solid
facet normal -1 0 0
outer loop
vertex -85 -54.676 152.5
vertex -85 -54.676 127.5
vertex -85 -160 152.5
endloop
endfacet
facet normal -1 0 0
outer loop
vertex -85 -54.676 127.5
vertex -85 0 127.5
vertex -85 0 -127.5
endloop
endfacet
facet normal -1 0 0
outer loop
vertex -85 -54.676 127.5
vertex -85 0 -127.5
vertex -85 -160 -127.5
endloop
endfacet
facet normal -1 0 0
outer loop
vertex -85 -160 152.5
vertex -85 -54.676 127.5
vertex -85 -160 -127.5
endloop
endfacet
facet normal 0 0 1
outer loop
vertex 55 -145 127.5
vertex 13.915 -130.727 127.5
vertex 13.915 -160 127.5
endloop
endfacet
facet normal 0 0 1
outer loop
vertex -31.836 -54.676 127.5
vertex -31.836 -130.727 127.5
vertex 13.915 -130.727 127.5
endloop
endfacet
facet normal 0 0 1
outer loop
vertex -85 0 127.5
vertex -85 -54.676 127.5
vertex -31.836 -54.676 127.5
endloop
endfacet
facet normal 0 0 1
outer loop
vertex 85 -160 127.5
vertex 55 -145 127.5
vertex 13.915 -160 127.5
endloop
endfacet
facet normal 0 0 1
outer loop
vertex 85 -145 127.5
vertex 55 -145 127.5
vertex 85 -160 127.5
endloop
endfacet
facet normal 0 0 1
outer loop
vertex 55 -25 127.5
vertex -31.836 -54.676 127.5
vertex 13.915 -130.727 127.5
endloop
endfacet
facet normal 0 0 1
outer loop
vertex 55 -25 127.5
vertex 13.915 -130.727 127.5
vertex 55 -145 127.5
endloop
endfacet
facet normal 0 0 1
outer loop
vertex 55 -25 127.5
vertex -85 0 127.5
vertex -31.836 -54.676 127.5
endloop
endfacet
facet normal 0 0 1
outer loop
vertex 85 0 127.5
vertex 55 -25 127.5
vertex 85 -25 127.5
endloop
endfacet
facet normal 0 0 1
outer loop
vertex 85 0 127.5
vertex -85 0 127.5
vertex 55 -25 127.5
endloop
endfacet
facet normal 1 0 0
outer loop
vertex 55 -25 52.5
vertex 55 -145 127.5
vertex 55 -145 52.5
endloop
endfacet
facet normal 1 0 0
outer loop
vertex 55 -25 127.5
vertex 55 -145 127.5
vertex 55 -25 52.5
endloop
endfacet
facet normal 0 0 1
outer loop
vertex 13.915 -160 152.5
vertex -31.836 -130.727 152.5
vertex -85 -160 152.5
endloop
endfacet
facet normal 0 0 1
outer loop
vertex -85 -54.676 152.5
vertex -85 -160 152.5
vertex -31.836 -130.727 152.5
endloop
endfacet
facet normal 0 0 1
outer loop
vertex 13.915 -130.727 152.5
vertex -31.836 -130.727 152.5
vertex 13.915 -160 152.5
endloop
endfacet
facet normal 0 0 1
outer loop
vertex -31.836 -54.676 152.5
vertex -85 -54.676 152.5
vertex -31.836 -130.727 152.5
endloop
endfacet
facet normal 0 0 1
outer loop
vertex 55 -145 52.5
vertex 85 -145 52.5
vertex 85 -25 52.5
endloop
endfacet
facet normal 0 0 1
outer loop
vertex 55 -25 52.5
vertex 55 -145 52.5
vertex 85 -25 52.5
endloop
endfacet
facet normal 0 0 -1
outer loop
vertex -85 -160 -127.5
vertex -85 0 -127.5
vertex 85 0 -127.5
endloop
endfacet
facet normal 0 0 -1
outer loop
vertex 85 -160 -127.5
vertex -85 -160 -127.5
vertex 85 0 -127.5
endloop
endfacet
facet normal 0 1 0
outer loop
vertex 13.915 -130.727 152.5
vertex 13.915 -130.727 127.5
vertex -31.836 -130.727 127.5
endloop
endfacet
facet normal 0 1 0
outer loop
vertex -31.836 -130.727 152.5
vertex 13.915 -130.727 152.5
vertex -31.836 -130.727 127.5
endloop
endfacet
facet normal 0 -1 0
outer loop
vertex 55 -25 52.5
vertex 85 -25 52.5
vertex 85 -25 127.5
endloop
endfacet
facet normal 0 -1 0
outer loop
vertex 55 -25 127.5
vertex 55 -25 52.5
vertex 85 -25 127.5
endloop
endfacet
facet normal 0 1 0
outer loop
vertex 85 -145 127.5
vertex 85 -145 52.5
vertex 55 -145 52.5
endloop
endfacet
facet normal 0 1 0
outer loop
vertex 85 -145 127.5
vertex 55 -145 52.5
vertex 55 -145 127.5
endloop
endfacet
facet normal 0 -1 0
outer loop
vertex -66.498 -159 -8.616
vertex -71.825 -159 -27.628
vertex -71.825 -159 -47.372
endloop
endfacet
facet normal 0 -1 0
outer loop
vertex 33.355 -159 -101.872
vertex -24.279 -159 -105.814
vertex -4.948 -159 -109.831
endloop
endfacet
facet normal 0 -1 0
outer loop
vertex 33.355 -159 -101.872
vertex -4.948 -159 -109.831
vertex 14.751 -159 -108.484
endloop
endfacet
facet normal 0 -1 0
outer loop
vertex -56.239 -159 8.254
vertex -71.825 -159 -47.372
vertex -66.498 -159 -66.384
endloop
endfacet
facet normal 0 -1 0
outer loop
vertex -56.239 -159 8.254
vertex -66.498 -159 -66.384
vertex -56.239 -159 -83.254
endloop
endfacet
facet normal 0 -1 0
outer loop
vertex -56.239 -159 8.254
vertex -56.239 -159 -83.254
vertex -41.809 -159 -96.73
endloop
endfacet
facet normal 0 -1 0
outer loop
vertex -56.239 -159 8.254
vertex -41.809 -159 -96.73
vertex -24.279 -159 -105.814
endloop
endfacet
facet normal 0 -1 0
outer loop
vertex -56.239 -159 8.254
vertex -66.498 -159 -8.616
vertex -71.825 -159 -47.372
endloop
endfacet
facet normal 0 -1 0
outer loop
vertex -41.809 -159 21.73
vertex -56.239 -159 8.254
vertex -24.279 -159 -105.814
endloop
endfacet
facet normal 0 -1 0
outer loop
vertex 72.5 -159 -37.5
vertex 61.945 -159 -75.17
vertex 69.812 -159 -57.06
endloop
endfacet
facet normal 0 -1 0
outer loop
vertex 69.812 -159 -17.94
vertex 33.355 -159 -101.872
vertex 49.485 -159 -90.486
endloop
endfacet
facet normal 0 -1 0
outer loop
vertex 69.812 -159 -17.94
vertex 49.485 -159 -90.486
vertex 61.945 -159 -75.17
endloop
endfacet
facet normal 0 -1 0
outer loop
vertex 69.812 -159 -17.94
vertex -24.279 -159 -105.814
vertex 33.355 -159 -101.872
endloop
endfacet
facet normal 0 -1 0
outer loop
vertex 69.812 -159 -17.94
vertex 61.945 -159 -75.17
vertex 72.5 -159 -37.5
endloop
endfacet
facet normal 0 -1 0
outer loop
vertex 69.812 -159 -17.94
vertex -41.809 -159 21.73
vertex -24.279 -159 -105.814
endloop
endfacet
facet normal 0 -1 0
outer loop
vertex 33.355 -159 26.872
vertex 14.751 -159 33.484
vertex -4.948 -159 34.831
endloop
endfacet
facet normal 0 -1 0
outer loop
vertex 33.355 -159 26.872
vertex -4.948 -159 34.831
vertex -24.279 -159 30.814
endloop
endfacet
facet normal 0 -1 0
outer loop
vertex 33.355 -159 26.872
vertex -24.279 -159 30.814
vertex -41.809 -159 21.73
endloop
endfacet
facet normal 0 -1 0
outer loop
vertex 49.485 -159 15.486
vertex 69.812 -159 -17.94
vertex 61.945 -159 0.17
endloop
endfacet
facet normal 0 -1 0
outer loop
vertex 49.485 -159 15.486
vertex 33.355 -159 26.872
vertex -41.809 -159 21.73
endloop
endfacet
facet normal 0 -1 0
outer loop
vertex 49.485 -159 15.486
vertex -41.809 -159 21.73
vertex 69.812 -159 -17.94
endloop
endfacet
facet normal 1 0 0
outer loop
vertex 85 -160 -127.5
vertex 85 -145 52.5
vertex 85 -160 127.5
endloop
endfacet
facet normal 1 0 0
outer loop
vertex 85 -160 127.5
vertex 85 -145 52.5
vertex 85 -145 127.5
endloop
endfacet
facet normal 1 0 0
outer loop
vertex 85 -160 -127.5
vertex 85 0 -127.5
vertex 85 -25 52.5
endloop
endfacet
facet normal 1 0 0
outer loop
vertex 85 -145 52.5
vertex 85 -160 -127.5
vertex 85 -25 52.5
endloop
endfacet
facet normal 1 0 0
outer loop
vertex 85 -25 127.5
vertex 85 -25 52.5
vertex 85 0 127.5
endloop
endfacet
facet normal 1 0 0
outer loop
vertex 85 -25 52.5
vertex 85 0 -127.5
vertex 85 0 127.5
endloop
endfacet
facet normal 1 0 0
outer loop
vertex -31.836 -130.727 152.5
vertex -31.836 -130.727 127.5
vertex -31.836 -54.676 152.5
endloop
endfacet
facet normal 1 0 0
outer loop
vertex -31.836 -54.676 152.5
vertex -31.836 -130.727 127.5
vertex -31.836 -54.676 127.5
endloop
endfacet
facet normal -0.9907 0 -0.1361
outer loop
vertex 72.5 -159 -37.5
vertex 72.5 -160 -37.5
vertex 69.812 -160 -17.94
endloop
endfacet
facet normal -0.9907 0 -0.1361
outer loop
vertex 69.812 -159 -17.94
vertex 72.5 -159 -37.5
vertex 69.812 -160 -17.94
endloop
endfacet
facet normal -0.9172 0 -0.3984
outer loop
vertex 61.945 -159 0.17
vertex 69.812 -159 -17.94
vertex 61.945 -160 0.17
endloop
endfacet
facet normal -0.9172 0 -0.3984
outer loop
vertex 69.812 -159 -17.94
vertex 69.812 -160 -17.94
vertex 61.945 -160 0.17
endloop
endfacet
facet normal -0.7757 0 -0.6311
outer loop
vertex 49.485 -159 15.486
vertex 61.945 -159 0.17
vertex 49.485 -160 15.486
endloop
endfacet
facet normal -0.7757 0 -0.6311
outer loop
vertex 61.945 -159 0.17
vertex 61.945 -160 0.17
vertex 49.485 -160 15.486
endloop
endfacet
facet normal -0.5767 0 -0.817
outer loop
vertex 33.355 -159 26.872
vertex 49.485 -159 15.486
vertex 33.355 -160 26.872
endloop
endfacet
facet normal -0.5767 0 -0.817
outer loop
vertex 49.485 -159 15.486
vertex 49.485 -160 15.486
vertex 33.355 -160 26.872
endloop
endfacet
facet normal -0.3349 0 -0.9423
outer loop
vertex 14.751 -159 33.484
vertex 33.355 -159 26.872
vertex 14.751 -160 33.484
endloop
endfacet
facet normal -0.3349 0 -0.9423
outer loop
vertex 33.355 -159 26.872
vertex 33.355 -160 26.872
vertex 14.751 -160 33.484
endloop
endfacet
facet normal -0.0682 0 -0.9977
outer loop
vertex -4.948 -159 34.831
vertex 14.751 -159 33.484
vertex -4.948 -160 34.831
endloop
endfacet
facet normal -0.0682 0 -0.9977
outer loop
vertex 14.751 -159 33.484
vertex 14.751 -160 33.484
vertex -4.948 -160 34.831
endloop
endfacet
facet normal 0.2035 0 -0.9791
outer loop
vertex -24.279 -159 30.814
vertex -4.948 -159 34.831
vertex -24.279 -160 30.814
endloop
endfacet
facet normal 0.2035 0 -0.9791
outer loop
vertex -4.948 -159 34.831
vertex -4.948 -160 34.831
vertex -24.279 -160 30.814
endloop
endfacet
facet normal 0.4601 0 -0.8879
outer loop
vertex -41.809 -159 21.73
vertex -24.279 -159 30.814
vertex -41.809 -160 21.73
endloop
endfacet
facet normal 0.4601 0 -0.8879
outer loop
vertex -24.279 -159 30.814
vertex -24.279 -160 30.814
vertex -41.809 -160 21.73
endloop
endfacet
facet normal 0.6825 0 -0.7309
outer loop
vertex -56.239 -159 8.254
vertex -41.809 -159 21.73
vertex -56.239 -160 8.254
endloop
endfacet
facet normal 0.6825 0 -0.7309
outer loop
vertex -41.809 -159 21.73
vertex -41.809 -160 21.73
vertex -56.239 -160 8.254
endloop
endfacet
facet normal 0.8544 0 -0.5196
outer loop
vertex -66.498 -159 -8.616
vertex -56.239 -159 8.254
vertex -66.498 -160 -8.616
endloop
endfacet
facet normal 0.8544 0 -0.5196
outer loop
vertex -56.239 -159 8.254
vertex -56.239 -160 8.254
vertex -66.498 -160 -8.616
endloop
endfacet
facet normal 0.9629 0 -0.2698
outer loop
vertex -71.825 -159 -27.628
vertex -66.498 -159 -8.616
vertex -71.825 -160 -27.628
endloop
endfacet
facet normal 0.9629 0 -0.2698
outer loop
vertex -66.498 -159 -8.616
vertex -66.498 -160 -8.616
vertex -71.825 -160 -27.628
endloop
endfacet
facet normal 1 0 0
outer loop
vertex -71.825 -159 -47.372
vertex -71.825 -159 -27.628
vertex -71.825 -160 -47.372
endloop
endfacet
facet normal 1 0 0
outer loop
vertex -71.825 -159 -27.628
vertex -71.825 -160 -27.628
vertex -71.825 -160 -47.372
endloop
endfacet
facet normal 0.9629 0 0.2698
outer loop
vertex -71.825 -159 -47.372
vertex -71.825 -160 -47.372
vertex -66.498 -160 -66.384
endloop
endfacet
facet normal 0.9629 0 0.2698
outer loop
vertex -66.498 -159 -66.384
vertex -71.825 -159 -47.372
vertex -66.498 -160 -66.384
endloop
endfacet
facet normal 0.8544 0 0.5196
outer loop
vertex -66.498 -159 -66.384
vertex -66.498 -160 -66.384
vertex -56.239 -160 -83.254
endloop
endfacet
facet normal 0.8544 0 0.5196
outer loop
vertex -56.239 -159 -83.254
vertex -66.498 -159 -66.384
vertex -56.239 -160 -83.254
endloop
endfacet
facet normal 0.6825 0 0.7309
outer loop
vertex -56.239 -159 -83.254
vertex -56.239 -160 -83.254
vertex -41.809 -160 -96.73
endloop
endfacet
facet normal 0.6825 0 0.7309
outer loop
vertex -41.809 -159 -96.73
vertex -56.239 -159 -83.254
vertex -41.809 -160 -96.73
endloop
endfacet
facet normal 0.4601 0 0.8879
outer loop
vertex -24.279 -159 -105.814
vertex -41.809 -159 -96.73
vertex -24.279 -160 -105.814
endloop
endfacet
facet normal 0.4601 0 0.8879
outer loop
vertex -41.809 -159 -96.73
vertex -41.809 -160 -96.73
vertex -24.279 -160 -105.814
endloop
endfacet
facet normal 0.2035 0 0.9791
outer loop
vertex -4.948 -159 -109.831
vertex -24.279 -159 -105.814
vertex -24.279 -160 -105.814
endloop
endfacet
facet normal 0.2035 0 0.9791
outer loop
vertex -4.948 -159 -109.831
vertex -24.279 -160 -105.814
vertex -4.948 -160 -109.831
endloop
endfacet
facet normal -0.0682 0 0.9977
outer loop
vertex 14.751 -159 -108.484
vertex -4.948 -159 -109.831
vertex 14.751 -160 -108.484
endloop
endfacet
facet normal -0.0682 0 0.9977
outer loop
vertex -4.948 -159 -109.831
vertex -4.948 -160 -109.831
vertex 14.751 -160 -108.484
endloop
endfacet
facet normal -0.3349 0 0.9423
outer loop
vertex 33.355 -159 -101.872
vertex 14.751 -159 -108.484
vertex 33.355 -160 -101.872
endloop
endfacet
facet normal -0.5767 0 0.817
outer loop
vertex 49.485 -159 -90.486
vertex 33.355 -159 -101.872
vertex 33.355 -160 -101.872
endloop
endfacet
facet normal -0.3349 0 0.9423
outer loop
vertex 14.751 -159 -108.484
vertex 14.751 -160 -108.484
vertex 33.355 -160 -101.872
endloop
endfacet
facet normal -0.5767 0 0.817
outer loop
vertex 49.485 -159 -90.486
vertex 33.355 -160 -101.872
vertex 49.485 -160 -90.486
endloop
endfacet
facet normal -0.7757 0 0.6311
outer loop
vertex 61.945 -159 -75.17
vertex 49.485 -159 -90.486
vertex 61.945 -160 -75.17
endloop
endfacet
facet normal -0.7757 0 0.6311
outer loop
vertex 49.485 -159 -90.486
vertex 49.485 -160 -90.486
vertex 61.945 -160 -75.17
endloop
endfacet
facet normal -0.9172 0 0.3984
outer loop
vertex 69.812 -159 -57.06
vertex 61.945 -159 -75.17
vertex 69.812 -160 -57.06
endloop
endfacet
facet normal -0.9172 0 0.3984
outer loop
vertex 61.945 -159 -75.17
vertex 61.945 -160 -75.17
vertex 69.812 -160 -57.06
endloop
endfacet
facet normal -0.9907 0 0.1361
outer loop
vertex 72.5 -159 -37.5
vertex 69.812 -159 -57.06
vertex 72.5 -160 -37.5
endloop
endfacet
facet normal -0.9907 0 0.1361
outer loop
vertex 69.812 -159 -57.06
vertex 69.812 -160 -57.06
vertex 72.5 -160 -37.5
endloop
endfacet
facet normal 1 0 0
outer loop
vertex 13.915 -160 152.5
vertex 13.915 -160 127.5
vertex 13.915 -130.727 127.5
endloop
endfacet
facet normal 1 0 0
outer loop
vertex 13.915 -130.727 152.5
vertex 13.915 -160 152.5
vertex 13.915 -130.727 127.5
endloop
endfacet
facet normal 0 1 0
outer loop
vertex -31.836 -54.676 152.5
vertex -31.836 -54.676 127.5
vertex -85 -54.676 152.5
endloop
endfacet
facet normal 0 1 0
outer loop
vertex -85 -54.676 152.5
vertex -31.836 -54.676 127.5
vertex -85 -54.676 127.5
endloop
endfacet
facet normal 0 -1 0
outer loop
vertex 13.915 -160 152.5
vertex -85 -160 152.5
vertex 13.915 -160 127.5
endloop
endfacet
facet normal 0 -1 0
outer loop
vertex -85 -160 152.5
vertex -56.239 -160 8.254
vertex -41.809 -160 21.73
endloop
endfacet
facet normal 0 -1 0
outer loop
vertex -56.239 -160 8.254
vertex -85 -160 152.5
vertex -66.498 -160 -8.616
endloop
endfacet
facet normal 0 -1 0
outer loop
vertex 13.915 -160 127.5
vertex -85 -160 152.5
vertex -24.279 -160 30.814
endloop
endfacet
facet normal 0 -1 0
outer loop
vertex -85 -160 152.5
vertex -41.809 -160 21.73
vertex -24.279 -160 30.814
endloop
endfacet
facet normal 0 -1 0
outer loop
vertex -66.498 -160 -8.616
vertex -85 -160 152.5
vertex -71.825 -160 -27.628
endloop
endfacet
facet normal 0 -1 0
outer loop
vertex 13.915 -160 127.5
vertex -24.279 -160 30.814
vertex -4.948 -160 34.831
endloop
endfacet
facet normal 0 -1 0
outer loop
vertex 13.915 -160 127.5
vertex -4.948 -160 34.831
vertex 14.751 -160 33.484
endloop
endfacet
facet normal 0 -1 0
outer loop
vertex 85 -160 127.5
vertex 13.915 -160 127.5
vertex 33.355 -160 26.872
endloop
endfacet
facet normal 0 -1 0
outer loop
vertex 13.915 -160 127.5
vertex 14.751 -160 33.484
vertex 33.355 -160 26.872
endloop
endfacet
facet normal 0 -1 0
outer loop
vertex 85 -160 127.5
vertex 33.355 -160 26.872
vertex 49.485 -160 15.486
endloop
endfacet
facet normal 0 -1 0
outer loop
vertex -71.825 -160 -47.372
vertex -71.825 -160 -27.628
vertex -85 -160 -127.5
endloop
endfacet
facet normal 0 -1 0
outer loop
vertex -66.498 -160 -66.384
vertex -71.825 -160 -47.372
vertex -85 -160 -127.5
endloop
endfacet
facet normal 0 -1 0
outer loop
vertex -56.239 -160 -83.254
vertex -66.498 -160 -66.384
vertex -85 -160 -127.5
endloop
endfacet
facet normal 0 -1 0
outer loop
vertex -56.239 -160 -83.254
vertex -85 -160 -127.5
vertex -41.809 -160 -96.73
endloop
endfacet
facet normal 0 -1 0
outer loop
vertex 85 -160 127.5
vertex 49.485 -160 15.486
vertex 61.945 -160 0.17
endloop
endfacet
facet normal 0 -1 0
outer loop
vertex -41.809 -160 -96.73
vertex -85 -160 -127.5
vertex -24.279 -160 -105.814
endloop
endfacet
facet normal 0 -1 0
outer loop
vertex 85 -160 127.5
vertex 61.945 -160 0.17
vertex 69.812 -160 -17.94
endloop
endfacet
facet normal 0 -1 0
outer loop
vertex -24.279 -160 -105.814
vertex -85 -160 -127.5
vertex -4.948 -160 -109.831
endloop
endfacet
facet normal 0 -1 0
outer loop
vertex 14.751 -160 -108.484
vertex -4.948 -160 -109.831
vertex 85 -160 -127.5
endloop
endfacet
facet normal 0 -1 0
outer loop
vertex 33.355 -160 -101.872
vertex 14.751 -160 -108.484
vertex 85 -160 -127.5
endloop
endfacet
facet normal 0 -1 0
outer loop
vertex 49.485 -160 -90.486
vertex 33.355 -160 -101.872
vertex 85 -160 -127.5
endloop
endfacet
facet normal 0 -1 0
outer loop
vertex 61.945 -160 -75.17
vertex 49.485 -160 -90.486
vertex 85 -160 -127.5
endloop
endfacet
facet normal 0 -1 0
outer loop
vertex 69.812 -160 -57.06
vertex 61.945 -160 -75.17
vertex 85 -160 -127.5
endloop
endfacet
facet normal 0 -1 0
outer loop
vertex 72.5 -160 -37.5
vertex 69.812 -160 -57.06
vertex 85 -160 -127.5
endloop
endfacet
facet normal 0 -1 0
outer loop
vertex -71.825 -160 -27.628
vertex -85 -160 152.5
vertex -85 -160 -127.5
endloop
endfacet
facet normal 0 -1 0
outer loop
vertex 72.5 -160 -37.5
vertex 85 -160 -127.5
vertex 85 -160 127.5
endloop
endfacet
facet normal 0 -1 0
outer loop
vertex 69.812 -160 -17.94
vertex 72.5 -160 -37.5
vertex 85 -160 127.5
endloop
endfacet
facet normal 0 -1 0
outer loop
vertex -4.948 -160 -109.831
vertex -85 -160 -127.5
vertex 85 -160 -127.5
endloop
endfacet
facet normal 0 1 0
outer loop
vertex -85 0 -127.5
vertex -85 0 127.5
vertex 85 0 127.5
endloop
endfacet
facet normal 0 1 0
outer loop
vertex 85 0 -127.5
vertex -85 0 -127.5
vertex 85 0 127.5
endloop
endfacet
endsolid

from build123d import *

# Parameters (mm, degrees)
F0_W     = 170
F0_H     = 255
F1_DEPTH = 160
F2_R     = 72.5
F3_DEPTH = 1
F4_W     = 120
F4_H     = 75
F5_DEPTH = 30
F7_DEPTH = 25


with BuildPart() as f1:
    # F0 (on Front) → F1 (new body)
    with BuildSketch(Plane.XZ):
        Rectangle(F0_W, F0_H)
    extrude(amount=F1_DEPTH)

    # F2 (on face) → F3 (cut)
    with BuildSketch(Plane.XZ.offset(160)):
        with Locations((0, -37.5)):
            Circle(F2_R)
    extrude(amount=-F3_DEPTH, mode=Mode.SUBTRACT)

    # F4 (on face) → F5 (cut)
    with BuildSketch(Plane.YZ.offset(85)):
        with Locations((-85, 90)):
            Rectangle(F4_W, F4_H)
    extrude(amount=-F5_DEPTH, mode=Mode.SUBTRACT)

    # F6 (on face) → F7 (join)
    with BuildSketch(Plane.XY.offset(127.5)):
        Polygon((-85, -130.726978), (-85, -160), (13.915417, -160), (13.915417, -130.726978), (-31.836193, -130.726978), (-31.836193, -54.676291), (-85, -54.676291), align=None)
    extrude(amount=F7_DEPTH)


solid = f1.part
